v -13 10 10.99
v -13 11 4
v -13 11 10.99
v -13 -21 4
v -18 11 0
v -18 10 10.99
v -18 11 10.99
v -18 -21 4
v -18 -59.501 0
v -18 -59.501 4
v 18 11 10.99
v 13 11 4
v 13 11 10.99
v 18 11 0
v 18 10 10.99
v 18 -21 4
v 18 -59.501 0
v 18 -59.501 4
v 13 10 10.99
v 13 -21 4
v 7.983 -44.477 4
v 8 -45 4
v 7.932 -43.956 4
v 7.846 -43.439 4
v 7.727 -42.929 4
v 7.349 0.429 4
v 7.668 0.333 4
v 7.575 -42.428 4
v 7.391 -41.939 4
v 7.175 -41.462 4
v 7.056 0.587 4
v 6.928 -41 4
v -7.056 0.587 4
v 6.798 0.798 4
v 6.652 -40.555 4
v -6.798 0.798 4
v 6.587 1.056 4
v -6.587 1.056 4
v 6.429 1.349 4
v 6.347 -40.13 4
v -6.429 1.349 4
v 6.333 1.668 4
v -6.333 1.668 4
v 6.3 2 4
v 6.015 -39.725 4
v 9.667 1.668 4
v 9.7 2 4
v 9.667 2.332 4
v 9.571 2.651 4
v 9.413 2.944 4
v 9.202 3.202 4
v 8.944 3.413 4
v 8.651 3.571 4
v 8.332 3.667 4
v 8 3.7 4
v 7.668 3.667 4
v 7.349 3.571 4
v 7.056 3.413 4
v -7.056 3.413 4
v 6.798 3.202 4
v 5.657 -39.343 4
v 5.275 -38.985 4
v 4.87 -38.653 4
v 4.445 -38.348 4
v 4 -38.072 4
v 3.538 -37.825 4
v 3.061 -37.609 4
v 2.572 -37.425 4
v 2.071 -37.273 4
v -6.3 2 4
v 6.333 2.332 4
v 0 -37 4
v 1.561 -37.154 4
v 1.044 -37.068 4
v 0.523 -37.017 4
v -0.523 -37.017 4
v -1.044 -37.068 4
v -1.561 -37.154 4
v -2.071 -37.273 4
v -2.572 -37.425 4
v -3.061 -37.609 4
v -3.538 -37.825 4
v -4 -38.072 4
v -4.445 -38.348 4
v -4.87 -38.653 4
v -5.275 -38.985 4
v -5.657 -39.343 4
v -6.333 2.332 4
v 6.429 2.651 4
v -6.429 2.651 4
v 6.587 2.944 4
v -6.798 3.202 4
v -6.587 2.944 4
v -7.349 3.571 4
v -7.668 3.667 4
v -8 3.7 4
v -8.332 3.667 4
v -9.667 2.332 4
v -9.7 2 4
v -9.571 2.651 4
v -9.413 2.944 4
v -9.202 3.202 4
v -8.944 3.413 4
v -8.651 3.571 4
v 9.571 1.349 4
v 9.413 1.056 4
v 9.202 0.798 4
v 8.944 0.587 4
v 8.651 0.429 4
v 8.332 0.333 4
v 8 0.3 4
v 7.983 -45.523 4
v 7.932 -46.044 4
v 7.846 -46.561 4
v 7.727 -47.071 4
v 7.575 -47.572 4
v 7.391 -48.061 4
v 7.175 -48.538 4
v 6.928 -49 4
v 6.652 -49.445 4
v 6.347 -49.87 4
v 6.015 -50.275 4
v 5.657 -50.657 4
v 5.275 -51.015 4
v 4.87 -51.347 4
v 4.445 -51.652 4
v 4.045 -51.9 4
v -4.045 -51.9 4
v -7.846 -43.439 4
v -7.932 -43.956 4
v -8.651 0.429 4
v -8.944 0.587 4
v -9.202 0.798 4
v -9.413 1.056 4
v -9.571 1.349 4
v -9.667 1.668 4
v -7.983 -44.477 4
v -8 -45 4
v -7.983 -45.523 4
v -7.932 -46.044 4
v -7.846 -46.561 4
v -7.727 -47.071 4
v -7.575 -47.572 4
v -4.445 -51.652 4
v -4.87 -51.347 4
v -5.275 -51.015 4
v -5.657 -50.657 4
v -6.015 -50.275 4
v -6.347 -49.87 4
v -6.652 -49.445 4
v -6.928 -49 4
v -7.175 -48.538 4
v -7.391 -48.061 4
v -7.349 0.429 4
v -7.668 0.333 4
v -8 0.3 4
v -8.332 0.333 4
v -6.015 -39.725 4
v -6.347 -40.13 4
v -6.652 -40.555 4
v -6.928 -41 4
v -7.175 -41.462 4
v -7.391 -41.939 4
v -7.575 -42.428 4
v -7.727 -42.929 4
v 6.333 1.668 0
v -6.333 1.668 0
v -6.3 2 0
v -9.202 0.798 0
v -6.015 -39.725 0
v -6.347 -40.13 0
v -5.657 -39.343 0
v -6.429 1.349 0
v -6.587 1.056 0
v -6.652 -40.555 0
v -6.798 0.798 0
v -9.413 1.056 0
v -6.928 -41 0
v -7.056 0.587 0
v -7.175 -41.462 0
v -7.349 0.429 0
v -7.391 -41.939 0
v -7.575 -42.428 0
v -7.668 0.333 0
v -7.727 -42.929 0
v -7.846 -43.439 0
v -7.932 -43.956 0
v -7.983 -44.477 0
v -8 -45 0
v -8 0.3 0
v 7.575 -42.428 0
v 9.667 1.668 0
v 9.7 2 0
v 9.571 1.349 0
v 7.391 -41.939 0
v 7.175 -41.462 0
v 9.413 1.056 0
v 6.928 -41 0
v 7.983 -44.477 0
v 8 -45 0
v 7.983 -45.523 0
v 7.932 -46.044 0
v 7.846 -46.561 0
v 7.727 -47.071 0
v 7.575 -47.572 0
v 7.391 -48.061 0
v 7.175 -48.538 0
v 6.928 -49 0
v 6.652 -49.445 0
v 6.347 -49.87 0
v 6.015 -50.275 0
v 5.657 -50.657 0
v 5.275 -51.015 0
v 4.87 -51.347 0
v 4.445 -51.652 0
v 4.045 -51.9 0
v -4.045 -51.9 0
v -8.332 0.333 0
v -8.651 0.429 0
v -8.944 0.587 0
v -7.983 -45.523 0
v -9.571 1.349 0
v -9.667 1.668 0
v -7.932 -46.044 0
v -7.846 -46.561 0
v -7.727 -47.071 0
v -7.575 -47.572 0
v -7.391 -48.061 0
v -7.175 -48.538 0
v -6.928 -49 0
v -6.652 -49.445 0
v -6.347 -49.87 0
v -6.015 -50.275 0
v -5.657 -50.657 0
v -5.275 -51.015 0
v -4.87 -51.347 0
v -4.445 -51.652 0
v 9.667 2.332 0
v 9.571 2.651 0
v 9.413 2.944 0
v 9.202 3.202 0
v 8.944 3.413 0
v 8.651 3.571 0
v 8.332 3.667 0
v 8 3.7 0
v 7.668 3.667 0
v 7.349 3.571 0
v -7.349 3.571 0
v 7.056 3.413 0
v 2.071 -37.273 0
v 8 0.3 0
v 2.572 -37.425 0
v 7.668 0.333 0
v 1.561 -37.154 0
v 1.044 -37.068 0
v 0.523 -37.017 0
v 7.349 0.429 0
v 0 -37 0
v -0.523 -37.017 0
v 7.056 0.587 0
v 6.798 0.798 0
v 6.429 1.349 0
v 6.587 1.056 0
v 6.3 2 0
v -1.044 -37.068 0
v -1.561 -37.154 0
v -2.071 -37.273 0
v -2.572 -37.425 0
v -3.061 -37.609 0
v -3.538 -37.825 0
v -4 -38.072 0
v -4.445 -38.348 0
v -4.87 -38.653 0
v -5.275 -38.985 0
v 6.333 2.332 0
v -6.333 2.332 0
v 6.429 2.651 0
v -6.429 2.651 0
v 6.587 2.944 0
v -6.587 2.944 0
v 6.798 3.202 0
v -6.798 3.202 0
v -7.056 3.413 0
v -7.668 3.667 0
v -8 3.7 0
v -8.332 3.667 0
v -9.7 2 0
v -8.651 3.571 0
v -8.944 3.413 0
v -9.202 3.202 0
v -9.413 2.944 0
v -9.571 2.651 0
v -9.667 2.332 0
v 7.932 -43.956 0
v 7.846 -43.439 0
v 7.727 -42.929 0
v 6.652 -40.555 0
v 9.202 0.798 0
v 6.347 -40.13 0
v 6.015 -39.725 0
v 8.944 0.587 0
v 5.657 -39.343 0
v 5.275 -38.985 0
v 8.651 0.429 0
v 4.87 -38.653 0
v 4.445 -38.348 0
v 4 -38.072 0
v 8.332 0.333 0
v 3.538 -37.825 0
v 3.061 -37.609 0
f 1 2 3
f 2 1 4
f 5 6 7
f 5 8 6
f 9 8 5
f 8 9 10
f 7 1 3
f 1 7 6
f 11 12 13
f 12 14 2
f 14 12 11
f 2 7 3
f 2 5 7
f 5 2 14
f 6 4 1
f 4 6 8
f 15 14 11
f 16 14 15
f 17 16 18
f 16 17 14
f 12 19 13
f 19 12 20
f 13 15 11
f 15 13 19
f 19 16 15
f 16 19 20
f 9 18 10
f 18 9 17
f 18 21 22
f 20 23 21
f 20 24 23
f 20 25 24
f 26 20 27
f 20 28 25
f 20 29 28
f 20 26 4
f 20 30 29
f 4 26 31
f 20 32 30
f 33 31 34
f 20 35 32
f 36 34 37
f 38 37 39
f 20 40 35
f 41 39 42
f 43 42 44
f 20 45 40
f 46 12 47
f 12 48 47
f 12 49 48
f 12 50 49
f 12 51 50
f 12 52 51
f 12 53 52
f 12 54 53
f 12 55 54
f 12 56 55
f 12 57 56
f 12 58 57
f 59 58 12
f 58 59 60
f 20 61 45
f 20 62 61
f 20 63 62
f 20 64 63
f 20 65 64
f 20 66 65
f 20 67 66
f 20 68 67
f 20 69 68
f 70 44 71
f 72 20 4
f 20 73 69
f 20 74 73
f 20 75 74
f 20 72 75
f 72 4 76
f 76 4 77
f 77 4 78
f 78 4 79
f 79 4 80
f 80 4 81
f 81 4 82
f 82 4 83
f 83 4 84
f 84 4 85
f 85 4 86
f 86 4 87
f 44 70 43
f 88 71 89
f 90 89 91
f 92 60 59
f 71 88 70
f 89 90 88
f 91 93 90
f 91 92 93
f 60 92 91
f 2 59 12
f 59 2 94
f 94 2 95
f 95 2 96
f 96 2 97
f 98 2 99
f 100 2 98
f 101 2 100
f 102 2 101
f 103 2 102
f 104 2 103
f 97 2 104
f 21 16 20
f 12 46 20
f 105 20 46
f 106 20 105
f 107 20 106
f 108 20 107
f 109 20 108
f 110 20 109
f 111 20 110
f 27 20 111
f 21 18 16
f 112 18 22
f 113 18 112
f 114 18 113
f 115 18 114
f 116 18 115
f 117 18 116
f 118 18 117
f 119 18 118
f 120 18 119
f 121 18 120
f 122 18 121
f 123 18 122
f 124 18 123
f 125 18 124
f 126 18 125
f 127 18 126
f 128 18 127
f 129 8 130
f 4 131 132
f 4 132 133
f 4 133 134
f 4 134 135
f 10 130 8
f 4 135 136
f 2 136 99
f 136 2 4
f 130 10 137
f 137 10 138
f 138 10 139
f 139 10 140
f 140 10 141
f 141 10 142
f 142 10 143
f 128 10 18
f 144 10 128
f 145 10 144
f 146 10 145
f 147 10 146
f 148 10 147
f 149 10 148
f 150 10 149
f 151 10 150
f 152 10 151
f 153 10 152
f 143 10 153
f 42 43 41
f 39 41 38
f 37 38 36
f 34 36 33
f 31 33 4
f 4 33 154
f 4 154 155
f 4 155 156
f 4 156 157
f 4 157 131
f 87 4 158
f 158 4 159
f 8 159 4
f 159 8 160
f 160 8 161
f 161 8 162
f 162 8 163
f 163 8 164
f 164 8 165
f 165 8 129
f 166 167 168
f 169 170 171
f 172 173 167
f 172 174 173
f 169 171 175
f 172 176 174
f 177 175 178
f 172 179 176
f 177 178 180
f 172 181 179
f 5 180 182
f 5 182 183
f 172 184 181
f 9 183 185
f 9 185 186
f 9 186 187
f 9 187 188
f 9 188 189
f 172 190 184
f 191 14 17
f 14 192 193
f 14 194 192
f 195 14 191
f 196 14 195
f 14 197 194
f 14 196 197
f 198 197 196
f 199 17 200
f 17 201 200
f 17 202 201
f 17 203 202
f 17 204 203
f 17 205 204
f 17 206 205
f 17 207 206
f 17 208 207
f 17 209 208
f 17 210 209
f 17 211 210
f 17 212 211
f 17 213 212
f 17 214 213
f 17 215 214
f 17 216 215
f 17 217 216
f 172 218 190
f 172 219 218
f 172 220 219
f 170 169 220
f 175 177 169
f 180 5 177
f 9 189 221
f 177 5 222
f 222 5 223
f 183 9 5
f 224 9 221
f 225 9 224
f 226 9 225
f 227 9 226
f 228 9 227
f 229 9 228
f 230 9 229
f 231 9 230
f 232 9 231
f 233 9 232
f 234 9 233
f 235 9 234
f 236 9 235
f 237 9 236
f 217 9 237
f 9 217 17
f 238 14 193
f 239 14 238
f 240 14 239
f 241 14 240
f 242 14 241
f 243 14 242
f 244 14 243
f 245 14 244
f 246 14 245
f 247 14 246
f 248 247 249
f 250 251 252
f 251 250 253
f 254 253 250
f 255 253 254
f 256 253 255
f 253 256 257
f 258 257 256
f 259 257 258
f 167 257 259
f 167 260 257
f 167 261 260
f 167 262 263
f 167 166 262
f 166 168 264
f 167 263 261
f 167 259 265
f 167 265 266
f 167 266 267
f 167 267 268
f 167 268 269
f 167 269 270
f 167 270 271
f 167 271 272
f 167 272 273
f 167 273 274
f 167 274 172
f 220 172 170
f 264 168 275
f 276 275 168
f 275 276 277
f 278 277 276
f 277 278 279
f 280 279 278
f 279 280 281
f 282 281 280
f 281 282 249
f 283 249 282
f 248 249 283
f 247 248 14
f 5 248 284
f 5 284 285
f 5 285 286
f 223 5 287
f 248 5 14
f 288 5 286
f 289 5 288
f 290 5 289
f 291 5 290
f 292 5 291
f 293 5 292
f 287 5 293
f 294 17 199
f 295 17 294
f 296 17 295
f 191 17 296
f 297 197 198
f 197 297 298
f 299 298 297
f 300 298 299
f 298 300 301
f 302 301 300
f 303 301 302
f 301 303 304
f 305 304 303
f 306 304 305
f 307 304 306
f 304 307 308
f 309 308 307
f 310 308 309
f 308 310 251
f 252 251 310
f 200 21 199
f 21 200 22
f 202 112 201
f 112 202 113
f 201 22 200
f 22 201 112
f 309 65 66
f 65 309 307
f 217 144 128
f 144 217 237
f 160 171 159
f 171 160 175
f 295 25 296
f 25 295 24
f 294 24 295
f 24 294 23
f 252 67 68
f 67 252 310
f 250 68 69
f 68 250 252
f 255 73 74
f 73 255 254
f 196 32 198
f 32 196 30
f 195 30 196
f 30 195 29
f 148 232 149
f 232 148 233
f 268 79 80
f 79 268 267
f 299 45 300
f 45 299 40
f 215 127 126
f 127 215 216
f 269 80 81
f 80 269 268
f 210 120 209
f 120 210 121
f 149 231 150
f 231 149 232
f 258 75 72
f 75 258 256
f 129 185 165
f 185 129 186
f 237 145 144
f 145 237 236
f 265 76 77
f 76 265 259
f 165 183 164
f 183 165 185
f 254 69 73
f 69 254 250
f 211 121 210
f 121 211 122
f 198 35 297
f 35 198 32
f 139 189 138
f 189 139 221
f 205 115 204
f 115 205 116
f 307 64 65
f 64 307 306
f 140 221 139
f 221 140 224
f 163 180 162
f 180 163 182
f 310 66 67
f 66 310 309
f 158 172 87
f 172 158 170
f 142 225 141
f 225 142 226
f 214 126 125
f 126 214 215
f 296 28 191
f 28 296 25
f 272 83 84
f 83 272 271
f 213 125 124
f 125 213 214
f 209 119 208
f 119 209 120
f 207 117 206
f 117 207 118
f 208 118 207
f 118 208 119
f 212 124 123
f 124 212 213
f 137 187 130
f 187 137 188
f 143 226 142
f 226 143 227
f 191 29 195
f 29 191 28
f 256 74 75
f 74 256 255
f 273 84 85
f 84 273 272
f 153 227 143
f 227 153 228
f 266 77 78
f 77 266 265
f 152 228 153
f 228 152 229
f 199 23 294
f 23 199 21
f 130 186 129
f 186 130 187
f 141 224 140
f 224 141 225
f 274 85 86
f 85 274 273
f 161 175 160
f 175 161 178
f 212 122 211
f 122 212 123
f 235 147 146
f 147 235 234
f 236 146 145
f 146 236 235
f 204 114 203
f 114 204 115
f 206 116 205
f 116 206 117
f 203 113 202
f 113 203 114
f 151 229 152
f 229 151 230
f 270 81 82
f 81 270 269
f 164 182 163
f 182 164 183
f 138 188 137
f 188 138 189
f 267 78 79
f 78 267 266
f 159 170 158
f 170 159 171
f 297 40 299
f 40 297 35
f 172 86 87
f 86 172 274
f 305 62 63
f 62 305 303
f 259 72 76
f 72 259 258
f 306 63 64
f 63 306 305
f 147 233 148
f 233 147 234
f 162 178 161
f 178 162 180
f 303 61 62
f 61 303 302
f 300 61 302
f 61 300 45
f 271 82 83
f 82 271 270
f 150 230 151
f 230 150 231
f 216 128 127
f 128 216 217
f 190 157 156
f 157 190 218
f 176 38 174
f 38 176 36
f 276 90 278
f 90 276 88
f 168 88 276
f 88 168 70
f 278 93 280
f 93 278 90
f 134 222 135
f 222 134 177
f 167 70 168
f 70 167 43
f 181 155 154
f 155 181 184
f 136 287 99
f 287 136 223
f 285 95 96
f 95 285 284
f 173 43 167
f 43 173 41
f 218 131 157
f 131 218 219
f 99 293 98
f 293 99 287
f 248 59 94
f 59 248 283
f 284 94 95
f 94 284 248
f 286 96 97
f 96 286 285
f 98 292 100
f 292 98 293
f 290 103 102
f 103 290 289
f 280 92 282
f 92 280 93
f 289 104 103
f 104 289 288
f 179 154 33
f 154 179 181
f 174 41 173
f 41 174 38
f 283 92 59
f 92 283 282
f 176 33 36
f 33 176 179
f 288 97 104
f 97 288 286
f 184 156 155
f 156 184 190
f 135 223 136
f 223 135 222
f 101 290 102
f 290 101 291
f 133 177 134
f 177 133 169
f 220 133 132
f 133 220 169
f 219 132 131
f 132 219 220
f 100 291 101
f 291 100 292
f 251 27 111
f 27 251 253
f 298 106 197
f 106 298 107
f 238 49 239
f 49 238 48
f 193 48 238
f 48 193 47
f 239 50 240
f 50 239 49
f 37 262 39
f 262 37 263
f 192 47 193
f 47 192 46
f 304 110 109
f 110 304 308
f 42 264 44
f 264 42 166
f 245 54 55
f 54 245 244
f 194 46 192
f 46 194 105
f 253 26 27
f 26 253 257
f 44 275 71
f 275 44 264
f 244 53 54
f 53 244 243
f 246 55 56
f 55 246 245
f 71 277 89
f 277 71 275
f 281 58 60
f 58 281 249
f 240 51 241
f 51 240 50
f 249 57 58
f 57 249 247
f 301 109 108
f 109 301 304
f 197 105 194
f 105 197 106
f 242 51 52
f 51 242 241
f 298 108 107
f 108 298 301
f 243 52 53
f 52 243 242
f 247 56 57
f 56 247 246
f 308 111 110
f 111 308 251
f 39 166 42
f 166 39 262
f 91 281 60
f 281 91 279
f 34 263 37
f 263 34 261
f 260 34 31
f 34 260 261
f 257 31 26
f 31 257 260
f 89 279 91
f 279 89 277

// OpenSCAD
// file: ../stage.scad
// ============================================================
//  Positioning stage: base (X dovetail) -> x-slider with column
//  (Z dovetail) -> z-slider (payload face toward +Y) + column cap.
//  Every axis: M3 adjust screw captured in the fixed part by head +
//  nylock, threading into a captive nut in the moving part
//  (0.5 mm/turn, both directions), plus an M3 lock screw.
//  Modules model parts in stage-local coordinates at mid travel.
// ============================================================
include <lib.scad>

// Dovetail standing on the column's +Y face, running along Z.
// multmatrix maps (x,y,z) -> (y,z,x): run->Z, width->X, height->Y.
module zrail_frame() { multmatrix([[0,1,0,0],[0,0,1,0],[1,0,0,0]]) children(); }

module stage_base() {
    rail_x0 = -stage_L / 2;
    rail_len = stage_L - stage_tab_t;
    tab_h = stage_base_h + xs_screw_z + 6;
    difference() {
        union() {
            translate([-stage_L / 2, -stage_D / 2, 0]) cube([stage_L, stage_D, stage_base_h]);
            translate([rail_x0, 0, stage_base_h]) dovetail_rail(rail_len);
            // adjust-screw tab
            translate([stage_L / 2 - stage_tab_t, -8, 0]) cube([stage_tab_t, 16, tab_h]);
        }
        wood_screw_holes(stage_mount_pts, stage_base_h, cbore = 3);
        // X adjust screw through tab (head outside, nylock inside)
        translate([stage_L / 2 - stage_tab_t - 1, 0, stage_base_h + xs_screw_z])
            rotate([0, 90, 0]) screw_hole(m3_d, stage_tab_t + 2);
    }
}

// Upper stack shares the x-slider's X offset.
module stage_x_slider() {
    x0 = xs_xc - xs_len / 2;
    difference() {
        union() {
            translate([x0, -xs_w / 2, stage_base_h]) cube([xs_len, xs_w, xs_h]);
            // column
            translate([xs_xc - col_w / 2, col_y0, xs_top - 0.01]) cube([col_w, col_t, col_h + 0.01]);
            translate([xs_xc, col_y1, xs_top]) zrail_frame() dovetail_rail(col_h);
        }
        translate([x0 - 1, 0, stage_base_h]) dovetail_slot(xs_len + 2);
        // X adjust: screw enters +X face, nut dropped in from the top
        translate([x0 + xs_len + 0.01, 0, stage_base_h + xs_screw_z]) rotate([0, -90, 0])
            screw_hole(m3_d, xs_adj_hole);
        translate([x0 + xs_len - 6 - m3_nut_t / 2, -(m3_nut_af + clr) / 2, stage_base_h + xs_screw_z - 3.5])
            cube([m3_nut_t + 0.4, m3_nut_af + clr, xs_h]);
        // X lock: horizontal from +Y face onto rail flank, nut from top
        translate([xs_xc + 8, xs_w / 2 + 0.01, stage_base_h + 2.5]) rotate([90, 0, 0])
            screw_hole(m3_d, xs_w / 2 - 3);
        translate([xs_xc + 8 - (m3_nut_af + clr) / 2, 9 - (m3_nut_t + 0.4) / 2, stage_base_h + 2.5 - 3.3])
            cube([m3_nut_af + clr, m3_nut_t + 0.4, xs_h]);
        // cap screws (tapped into column top)
        for (sx = [-8, 8]) translate([xs_xc + sx, col_y0 + 5, col_top - 10])
            screw_hole(m3_tap, 10.1);
    }
}

module stage_z_slider() {
    y0 = col_y1;
    x0 = xs_xc - zs_w / 2;
    difference() {
        translate([x0, y0, zs_z0]) cube([zs_w, zs_t, zs_h]);
        translate([xs_xc, col_y1, zs_z0 - 1]) zrail_frame() dovetail_slot(zs_h + 2);
        // payload holes + nut slots from the bottom
        for (p = payload_pts) {
            translate([xs_xc + p[0], payload_face_y + 0.01, stage_payload_z + p[1]])
                rotate([90, 0, 0]) screw_hole(m3_d, 7.5);
            translate([xs_xc + p[0] - (m3_nut_af + clr) / 2, payload_face_y - 4 - (m3_nut_t + 0.4) / 2, zs_z0 - 1])
                cube([m3_nut_af + clr, m3_nut_t + 0.4, zs_h / 2 + 1 + 3.3]);
        }
        // Z adjust: through hole, nut slot from the -X side 5 below the top
        translate([xs_xc + zs_screw_x, zs_screw_y, zs_z0 + zs_h - zs_adj_hole]) screw_hole(m3_d, zs_adj_hole + 0.1);
        translate([x0 - 1, zs_screw_y - (m3_nut_af + clr) / 2, zs_z0 + zs_h - 5 - (m3_nut_t + 0.4) / 2])
            cube([zs_screw_x + zs_w / 2 + 1 + (m3_nut_af + clr) / 2, m3_nut_af + clr, m3_nut_t + 0.4]);
        // Z lock: from the +X (outward) side onto the rail flank, nut dropped in from the top
        lz = zs_z0 + zs_h - 5;
        x1 = x0 + zs_w;
        translate([x1 + 0.01, col_y1 + 2, lz]) rotate([0, -90, 0]) screw_hole(m3_d, zs_w / 2 - 4);
        translate([x1 - 2.5 - (m3_nut_t + 0.4), col_y1 + 2 - zl_pocket_w / 2, lz - (m3_nut_af + clr) / 2 / cos(30)])
            cube([m3_nut_t + 0.4, zl_pocket_w, zs_h]);
    }
}

module stage_z_cap() {
    difference() {
        // stops 1 mm short of the payload face so the payload never rubs it
        translate([xs_xc - col_w / 2, col_y0, col_top]) cube([col_w, payload_face_y - col_y0 - 1, cap_t]);
        for (sx = [-8, 8]) translate([xs_xc + sx, col_y0 + 5, col_top]) screw_hole(m3_d, cap_t);
        translate([xs_xc + zs_screw_x, zs_screw_y, col_top]) screw_hole(m3_d, cap_t);
    }
}

// ---- placed at a fine-travel offset (dx, dz) ----
module stage_x_slider_placed(dx = 0) { translate([dx, 0, 0]) stage_x_slider(); }
module stage_z_cap_placed(dx = 0)    { translate([dx, 0, 0]) stage_z_cap(); }
module stage_z_slider_placed(dx = 0, dz = 0) { translate([dx, 0, dz]) stage_z_slider(); }

// Children placed at the payload face centre (origin on the face, +Y out).
module stage_payload_origin(dx = 0, dz = 0) {
    translate([xs_xc + dx, payload_face_y, stage_payload_z + dz]) children();
}

// Optional mirror (tower B) wraps the stage-local geometry.
module stage_hand(mir) { if (mir) mirror([1, 0, 0]) children(); else children(); }

module stage_assembly(dx = 0, dz = 0) {
    color("SteelBlue") stage_base();
    color("LightSteelBlue") stage_x_slider_placed(dx);
    color("SkyBlue") stage_z_cap_placed(dx);
    color("CadetBlue") stage_z_slider_placed(dx, dz);
}

// ---- travel checks ----
_right_gap = (stage_L / 2 - stage_tab_t) - (xs_xc + xs_len / 2) - locknut_t;
_left_ok   = 10;   // slider may overhang the rail start by up to 10 mm
echo("CHECK", "stage_travel_x", 2 * min(_right_gap, _left_ok));
// adjust screws: head on the fixed tab/cap, tip must pass the moving nut
// at the far travel end and stay inside the hole at the near end
_xnut = xs_xc + xs_len / 2 - 6;                  // nut centre X at mid
_xtip = stage_L / 2 - x_adj_len;
echo("CHECK", "x_adj_engage", (_xnut - stage_travel - (m3_nut_t + 0.4) / 2) - _xtip);
echo("CHECK", "x_adj_hole", _xtip - (xs_xc + xs_len / 2 + stage_travel - xs_adj_hole));
_znut = zs_z0 + zs_h - 5;
_ztip = stage_top_z - z_adj_len;
echo("CHECK", "z_adj_engage", (_znut - stage_travel - (m3_nut_t + 0.4) / 2) - _ztip);
echo("CHECK", "z_adj_hole", _ztip - (zs_z0 + zs_h + stage_travel - zs_adj_hole));
echo("CHECK", "z_lock_pocket_w", zl_pocket_w);
echo("CHECK", "stage_travel_z", 2 * min(stage_gap_z, cap_gap - locknut_t));
// file: ../port_tower.scad
// ============================================================
//  Female port tower: positioning stage (rotated 180 deg so its
//  payload face looks toward -Y) + bracket plate with the keyed
//  D-hole. The bulkhead goes in from the back (flange behind the
//  plate), nut on the front. Plate front face is at world y=0.
// ============================================================
include <stage.scad>

bracket_w      = 36;
bracket_hole_dz = port_z - stage_payload_z;   // hole above payload centre
bracket_bot    = -zs_h / 2;
bracket_top    = bracket_hole_dz + bh_nut_af / cos(30) / 2 + 3;
rib_t          = 5;     // rib width (X)
rib_d          = 7;     // rib depth (out of the plate front)

// Payload-face coordinates: origin at face centre, +Y away from the stage.
module port_bracket() {
    difference() {
        union() {
            translate([-bracket_w / 2, 0, bracket_bot]) cube([bracket_w, plate_t, bracket_top - bracket_bot]);
            // stiffening ribs, outboard of the nut and clear of the plug clamp
            for (sx = [-1, 1])
                translate([sx > 0 ? bracket_w / 2 - rib_t : -bracket_w / 2, plate_t - 0.01, bracket_bot])
                    hull() {
                        cube([rib_t, rib_d, 1]);
                        translate([0, 0, bracket_hole_dz - 14]) cube([rib_t, 0.01, 1]);
                    }
        }
        // keyed D-hole, flat on top
        translate([0, plate_t, bracket_hole_dz]) rotate([90, 0, 0]) d_hole(t = plate_t);
        // mounting screws into the z-slider's captive nuts
        for (p = payload_pts) translate([p[0], -0.01, p[1]]) rotate([-90, 0, 0]) {
            screw_hole(m3_d, plate_t + rib_d);
        }
    }
}

// Whole tower in world coordinates at fine-travel offset (dx, dz),
// measured in world X / Z.
// Tower B (i=1) is the mirror image so its X adjust screw faces outward.
module port_tower_world(i, dx = 0, dz = 0) {
    ldx = i == 0 ? -dx : dx;   // world dx -> stage-local dx
    translate([tower_x(i), tower_y, 0]) rotate([0, 0, 180]) stage_hand(i == 1) {
        stage_assembly(ldx, dz);
        stage_payload_origin(ldx, dz) color("Orange") port_bracket();
    }
}

// Bulkhead connector stand-in (for checks / preview), world coords.
module bulkhead_world(i, dx = 0, dz = 0) {
    translate([port_x[i] + dx, port_face_y, port_z + dz]) rotate([90, 0, 0]) color("DimGray") {
        cylinder(d = bh_thread_d, h = bh_thread_len - plate_t);                   // thread + face
        cylinder(d = bh_nut_af / cos(30), h = bh_nut_t, $fn = 6);                  // nut
        translate([0, 0, -plate_t - 2]) cylinder(d = bh_flange_d, h = 2);          // flange
        translate([0, 0, -plate_t - 40]) cylinder(d = 14, h = 38);                 // body
    }
}

echo("CHECK", "port_z", port_z);
// main file
// Female port bracket plate. Print with the flat back face (the side that
// bolts to the stage) on the bed, ribs up. Qty 2.
include <../port_tower.scad>
rotate([90, 0, 0]) port_bracket();
